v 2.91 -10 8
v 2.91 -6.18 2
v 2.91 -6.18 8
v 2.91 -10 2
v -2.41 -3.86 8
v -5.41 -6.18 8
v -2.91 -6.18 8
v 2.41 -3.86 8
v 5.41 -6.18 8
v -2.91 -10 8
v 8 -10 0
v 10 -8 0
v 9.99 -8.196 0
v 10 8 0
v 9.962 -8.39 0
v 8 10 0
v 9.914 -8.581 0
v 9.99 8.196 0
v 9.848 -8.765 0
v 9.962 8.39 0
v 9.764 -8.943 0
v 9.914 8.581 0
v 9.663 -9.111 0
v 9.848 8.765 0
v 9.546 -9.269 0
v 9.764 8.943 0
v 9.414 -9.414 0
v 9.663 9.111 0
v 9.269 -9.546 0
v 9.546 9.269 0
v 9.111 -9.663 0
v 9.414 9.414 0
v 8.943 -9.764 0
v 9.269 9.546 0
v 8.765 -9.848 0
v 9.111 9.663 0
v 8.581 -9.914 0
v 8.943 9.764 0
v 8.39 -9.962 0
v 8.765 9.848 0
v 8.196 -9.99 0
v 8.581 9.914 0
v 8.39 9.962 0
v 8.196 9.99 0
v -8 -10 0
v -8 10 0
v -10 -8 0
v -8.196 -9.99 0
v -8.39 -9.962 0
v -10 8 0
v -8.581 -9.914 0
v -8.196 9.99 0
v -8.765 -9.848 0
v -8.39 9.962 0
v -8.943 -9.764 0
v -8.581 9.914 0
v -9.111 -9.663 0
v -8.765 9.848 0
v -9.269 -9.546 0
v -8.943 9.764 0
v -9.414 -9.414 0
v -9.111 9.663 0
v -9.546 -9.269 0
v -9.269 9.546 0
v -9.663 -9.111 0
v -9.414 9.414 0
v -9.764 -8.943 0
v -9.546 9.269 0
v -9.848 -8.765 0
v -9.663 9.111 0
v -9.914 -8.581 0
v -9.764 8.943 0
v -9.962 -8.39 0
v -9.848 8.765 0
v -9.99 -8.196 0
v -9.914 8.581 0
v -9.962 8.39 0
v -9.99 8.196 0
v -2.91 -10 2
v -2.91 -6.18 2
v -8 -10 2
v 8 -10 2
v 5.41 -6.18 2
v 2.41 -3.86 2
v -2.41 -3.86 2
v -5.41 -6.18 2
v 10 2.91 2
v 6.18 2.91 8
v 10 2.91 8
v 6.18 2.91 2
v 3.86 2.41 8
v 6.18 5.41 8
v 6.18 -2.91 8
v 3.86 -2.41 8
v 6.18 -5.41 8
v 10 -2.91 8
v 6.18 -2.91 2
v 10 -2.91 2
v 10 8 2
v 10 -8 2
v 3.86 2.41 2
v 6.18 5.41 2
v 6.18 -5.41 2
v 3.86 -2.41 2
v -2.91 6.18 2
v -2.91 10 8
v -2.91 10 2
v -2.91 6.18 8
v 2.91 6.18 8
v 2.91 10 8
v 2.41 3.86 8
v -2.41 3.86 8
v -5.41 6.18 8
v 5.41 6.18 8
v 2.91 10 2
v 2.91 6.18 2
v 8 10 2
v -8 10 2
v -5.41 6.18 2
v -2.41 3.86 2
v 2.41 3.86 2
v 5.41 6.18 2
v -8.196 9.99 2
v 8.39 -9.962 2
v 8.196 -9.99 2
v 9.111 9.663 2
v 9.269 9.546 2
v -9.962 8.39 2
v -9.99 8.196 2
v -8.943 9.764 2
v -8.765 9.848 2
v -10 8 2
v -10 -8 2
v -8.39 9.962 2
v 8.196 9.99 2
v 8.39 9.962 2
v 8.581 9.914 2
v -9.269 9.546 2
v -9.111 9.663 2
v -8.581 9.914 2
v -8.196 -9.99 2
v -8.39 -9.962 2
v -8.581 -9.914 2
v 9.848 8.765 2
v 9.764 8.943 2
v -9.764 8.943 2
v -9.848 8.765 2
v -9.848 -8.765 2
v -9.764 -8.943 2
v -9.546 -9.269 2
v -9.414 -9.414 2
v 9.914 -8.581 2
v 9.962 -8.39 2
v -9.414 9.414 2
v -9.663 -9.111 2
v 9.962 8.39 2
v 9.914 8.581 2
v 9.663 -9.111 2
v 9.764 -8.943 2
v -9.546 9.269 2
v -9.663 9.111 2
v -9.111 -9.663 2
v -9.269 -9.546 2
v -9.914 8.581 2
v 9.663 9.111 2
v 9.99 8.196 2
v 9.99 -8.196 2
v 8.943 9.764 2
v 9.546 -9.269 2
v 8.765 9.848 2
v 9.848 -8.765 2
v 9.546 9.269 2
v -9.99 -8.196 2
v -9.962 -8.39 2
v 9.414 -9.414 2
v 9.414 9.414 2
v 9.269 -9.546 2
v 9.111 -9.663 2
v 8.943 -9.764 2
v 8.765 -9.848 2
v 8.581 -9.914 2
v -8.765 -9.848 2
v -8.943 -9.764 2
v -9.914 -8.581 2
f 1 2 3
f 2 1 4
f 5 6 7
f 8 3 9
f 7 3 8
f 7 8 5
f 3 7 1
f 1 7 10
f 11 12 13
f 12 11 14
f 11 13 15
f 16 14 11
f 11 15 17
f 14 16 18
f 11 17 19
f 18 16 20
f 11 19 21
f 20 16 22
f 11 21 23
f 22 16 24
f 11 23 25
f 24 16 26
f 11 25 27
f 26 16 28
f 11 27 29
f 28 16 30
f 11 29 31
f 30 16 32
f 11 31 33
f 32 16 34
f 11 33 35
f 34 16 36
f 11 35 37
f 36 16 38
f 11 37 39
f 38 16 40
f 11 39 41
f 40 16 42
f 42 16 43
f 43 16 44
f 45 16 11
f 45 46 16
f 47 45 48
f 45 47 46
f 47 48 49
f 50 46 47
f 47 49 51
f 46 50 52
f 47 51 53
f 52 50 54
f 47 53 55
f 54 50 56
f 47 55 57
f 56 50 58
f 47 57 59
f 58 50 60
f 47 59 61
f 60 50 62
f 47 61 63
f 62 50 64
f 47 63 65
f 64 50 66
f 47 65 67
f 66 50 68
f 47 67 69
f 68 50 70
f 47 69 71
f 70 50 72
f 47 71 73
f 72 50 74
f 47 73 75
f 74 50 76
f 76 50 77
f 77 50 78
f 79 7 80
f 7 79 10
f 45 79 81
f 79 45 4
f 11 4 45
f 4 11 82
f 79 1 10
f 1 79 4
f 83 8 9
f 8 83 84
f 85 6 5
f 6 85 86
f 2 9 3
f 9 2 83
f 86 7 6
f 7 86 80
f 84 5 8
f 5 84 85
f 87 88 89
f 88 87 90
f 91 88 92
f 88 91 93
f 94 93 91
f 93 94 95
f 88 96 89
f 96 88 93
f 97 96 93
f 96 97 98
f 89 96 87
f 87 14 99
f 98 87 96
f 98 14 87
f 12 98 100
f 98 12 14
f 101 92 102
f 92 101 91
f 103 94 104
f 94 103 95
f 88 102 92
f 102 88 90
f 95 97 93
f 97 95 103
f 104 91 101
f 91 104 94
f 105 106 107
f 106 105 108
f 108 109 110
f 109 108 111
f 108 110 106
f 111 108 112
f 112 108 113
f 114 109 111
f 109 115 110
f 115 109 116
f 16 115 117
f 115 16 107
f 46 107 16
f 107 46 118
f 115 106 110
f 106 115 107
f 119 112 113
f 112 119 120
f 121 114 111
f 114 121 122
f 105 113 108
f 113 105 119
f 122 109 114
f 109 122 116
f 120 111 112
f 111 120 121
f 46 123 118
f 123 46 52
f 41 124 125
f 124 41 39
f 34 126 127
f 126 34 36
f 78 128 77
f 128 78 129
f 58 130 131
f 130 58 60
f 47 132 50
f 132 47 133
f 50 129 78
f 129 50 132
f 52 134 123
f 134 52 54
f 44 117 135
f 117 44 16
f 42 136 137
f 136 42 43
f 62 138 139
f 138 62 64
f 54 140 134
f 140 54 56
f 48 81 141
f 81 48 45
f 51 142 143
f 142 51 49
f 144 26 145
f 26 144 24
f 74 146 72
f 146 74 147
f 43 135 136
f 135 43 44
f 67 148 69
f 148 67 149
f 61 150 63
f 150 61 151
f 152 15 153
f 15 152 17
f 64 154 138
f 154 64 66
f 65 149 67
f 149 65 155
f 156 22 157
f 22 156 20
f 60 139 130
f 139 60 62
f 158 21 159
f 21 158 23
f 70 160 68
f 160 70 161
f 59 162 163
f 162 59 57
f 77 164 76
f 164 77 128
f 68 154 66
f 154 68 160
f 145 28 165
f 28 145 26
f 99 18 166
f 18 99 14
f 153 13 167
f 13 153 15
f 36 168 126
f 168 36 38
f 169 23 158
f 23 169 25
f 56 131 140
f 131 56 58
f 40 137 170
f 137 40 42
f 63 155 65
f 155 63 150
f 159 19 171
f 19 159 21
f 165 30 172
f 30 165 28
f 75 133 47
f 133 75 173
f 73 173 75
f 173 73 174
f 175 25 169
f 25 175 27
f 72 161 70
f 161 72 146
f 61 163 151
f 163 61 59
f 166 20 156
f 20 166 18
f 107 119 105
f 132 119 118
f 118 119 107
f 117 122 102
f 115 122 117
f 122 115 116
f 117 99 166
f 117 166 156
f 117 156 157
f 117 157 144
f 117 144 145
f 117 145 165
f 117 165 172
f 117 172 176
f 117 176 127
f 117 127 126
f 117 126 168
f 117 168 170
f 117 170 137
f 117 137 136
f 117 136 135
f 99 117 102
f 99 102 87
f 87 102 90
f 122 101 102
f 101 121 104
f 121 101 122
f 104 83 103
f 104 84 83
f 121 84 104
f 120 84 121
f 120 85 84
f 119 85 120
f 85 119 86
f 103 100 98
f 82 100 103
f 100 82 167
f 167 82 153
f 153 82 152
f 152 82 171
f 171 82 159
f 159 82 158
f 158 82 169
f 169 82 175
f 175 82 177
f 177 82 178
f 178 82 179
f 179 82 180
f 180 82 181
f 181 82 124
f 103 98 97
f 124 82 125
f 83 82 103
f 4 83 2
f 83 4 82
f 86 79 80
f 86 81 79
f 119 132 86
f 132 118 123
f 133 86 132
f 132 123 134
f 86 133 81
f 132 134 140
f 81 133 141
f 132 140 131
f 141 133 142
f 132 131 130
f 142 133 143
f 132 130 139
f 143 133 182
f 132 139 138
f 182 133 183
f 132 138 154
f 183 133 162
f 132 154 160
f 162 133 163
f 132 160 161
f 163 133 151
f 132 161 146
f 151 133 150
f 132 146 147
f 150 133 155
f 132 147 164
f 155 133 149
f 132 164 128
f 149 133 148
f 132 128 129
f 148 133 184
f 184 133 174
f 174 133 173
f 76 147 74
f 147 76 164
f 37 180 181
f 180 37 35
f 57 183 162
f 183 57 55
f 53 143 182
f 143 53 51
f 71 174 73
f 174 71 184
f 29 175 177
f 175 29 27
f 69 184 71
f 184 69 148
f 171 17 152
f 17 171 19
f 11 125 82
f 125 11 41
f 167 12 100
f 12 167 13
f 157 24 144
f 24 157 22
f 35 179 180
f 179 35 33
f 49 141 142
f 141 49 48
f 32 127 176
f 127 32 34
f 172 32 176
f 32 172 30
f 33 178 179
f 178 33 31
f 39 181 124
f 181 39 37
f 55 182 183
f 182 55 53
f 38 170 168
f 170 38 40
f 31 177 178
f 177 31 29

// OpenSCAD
$fn=64;

slot_width=6;
slot_thickness=2;

t_width=6;
t_depth=2;

trap_bot_width=11;
trap_top_width=5;
trap_depth=2.5;

extrusion_width=20;
cover_thickness=2;
corner_rounding=2;
hole_size=0;

tab_height=cover_thickness+6;

undersize=0.18;			//this may need be adjusted for a good fit

difference() {
	union() {
		for (a=[0:2])
			rotate([0,0,90*a])
				translate([0,-extrusion_width/2,0])
					#t_slot();
		
		translate([-extrusion_width/2+corner_rounding, -extrusion_width/2+corner_rounding,0])
			minkowski() {
				cube([extrusion_width-corner_rounding*2,extrusion_width-corner_rounding*2,cover_thickness-1]);
				cylinder(r=corner_rounding, h=1);
			}
	}
	cylinder(r=hole_size/2, h=cover_thickness*4, center=true);
}

module t_slot() {
	translate([-slot_width/2+undersize/2,0,0])
		cube([slot_width-undersize, slot_thickness+t_depth, tab_height]);
	translate([-t_width/2+undersize/2,slot_thickness,0])
		cube([t_width-undersize,t_depth-undersize+0.01,tab_height]);
	translate([0,slot_thickness+t_depth-undersize,0])
		linear_extrude(height=tab_height)
			trapezoid(bottom=trap_bot_width-undersize, top=trap_top_width-undersize, height=trap_depth-undersize);
}


module trapezoid(bottom=10, top=5, height=2)
{
	polygon(points=[[-bottom/2,0],[bottom/2,0],[top/2,height],[-top/2,height]]);
}
